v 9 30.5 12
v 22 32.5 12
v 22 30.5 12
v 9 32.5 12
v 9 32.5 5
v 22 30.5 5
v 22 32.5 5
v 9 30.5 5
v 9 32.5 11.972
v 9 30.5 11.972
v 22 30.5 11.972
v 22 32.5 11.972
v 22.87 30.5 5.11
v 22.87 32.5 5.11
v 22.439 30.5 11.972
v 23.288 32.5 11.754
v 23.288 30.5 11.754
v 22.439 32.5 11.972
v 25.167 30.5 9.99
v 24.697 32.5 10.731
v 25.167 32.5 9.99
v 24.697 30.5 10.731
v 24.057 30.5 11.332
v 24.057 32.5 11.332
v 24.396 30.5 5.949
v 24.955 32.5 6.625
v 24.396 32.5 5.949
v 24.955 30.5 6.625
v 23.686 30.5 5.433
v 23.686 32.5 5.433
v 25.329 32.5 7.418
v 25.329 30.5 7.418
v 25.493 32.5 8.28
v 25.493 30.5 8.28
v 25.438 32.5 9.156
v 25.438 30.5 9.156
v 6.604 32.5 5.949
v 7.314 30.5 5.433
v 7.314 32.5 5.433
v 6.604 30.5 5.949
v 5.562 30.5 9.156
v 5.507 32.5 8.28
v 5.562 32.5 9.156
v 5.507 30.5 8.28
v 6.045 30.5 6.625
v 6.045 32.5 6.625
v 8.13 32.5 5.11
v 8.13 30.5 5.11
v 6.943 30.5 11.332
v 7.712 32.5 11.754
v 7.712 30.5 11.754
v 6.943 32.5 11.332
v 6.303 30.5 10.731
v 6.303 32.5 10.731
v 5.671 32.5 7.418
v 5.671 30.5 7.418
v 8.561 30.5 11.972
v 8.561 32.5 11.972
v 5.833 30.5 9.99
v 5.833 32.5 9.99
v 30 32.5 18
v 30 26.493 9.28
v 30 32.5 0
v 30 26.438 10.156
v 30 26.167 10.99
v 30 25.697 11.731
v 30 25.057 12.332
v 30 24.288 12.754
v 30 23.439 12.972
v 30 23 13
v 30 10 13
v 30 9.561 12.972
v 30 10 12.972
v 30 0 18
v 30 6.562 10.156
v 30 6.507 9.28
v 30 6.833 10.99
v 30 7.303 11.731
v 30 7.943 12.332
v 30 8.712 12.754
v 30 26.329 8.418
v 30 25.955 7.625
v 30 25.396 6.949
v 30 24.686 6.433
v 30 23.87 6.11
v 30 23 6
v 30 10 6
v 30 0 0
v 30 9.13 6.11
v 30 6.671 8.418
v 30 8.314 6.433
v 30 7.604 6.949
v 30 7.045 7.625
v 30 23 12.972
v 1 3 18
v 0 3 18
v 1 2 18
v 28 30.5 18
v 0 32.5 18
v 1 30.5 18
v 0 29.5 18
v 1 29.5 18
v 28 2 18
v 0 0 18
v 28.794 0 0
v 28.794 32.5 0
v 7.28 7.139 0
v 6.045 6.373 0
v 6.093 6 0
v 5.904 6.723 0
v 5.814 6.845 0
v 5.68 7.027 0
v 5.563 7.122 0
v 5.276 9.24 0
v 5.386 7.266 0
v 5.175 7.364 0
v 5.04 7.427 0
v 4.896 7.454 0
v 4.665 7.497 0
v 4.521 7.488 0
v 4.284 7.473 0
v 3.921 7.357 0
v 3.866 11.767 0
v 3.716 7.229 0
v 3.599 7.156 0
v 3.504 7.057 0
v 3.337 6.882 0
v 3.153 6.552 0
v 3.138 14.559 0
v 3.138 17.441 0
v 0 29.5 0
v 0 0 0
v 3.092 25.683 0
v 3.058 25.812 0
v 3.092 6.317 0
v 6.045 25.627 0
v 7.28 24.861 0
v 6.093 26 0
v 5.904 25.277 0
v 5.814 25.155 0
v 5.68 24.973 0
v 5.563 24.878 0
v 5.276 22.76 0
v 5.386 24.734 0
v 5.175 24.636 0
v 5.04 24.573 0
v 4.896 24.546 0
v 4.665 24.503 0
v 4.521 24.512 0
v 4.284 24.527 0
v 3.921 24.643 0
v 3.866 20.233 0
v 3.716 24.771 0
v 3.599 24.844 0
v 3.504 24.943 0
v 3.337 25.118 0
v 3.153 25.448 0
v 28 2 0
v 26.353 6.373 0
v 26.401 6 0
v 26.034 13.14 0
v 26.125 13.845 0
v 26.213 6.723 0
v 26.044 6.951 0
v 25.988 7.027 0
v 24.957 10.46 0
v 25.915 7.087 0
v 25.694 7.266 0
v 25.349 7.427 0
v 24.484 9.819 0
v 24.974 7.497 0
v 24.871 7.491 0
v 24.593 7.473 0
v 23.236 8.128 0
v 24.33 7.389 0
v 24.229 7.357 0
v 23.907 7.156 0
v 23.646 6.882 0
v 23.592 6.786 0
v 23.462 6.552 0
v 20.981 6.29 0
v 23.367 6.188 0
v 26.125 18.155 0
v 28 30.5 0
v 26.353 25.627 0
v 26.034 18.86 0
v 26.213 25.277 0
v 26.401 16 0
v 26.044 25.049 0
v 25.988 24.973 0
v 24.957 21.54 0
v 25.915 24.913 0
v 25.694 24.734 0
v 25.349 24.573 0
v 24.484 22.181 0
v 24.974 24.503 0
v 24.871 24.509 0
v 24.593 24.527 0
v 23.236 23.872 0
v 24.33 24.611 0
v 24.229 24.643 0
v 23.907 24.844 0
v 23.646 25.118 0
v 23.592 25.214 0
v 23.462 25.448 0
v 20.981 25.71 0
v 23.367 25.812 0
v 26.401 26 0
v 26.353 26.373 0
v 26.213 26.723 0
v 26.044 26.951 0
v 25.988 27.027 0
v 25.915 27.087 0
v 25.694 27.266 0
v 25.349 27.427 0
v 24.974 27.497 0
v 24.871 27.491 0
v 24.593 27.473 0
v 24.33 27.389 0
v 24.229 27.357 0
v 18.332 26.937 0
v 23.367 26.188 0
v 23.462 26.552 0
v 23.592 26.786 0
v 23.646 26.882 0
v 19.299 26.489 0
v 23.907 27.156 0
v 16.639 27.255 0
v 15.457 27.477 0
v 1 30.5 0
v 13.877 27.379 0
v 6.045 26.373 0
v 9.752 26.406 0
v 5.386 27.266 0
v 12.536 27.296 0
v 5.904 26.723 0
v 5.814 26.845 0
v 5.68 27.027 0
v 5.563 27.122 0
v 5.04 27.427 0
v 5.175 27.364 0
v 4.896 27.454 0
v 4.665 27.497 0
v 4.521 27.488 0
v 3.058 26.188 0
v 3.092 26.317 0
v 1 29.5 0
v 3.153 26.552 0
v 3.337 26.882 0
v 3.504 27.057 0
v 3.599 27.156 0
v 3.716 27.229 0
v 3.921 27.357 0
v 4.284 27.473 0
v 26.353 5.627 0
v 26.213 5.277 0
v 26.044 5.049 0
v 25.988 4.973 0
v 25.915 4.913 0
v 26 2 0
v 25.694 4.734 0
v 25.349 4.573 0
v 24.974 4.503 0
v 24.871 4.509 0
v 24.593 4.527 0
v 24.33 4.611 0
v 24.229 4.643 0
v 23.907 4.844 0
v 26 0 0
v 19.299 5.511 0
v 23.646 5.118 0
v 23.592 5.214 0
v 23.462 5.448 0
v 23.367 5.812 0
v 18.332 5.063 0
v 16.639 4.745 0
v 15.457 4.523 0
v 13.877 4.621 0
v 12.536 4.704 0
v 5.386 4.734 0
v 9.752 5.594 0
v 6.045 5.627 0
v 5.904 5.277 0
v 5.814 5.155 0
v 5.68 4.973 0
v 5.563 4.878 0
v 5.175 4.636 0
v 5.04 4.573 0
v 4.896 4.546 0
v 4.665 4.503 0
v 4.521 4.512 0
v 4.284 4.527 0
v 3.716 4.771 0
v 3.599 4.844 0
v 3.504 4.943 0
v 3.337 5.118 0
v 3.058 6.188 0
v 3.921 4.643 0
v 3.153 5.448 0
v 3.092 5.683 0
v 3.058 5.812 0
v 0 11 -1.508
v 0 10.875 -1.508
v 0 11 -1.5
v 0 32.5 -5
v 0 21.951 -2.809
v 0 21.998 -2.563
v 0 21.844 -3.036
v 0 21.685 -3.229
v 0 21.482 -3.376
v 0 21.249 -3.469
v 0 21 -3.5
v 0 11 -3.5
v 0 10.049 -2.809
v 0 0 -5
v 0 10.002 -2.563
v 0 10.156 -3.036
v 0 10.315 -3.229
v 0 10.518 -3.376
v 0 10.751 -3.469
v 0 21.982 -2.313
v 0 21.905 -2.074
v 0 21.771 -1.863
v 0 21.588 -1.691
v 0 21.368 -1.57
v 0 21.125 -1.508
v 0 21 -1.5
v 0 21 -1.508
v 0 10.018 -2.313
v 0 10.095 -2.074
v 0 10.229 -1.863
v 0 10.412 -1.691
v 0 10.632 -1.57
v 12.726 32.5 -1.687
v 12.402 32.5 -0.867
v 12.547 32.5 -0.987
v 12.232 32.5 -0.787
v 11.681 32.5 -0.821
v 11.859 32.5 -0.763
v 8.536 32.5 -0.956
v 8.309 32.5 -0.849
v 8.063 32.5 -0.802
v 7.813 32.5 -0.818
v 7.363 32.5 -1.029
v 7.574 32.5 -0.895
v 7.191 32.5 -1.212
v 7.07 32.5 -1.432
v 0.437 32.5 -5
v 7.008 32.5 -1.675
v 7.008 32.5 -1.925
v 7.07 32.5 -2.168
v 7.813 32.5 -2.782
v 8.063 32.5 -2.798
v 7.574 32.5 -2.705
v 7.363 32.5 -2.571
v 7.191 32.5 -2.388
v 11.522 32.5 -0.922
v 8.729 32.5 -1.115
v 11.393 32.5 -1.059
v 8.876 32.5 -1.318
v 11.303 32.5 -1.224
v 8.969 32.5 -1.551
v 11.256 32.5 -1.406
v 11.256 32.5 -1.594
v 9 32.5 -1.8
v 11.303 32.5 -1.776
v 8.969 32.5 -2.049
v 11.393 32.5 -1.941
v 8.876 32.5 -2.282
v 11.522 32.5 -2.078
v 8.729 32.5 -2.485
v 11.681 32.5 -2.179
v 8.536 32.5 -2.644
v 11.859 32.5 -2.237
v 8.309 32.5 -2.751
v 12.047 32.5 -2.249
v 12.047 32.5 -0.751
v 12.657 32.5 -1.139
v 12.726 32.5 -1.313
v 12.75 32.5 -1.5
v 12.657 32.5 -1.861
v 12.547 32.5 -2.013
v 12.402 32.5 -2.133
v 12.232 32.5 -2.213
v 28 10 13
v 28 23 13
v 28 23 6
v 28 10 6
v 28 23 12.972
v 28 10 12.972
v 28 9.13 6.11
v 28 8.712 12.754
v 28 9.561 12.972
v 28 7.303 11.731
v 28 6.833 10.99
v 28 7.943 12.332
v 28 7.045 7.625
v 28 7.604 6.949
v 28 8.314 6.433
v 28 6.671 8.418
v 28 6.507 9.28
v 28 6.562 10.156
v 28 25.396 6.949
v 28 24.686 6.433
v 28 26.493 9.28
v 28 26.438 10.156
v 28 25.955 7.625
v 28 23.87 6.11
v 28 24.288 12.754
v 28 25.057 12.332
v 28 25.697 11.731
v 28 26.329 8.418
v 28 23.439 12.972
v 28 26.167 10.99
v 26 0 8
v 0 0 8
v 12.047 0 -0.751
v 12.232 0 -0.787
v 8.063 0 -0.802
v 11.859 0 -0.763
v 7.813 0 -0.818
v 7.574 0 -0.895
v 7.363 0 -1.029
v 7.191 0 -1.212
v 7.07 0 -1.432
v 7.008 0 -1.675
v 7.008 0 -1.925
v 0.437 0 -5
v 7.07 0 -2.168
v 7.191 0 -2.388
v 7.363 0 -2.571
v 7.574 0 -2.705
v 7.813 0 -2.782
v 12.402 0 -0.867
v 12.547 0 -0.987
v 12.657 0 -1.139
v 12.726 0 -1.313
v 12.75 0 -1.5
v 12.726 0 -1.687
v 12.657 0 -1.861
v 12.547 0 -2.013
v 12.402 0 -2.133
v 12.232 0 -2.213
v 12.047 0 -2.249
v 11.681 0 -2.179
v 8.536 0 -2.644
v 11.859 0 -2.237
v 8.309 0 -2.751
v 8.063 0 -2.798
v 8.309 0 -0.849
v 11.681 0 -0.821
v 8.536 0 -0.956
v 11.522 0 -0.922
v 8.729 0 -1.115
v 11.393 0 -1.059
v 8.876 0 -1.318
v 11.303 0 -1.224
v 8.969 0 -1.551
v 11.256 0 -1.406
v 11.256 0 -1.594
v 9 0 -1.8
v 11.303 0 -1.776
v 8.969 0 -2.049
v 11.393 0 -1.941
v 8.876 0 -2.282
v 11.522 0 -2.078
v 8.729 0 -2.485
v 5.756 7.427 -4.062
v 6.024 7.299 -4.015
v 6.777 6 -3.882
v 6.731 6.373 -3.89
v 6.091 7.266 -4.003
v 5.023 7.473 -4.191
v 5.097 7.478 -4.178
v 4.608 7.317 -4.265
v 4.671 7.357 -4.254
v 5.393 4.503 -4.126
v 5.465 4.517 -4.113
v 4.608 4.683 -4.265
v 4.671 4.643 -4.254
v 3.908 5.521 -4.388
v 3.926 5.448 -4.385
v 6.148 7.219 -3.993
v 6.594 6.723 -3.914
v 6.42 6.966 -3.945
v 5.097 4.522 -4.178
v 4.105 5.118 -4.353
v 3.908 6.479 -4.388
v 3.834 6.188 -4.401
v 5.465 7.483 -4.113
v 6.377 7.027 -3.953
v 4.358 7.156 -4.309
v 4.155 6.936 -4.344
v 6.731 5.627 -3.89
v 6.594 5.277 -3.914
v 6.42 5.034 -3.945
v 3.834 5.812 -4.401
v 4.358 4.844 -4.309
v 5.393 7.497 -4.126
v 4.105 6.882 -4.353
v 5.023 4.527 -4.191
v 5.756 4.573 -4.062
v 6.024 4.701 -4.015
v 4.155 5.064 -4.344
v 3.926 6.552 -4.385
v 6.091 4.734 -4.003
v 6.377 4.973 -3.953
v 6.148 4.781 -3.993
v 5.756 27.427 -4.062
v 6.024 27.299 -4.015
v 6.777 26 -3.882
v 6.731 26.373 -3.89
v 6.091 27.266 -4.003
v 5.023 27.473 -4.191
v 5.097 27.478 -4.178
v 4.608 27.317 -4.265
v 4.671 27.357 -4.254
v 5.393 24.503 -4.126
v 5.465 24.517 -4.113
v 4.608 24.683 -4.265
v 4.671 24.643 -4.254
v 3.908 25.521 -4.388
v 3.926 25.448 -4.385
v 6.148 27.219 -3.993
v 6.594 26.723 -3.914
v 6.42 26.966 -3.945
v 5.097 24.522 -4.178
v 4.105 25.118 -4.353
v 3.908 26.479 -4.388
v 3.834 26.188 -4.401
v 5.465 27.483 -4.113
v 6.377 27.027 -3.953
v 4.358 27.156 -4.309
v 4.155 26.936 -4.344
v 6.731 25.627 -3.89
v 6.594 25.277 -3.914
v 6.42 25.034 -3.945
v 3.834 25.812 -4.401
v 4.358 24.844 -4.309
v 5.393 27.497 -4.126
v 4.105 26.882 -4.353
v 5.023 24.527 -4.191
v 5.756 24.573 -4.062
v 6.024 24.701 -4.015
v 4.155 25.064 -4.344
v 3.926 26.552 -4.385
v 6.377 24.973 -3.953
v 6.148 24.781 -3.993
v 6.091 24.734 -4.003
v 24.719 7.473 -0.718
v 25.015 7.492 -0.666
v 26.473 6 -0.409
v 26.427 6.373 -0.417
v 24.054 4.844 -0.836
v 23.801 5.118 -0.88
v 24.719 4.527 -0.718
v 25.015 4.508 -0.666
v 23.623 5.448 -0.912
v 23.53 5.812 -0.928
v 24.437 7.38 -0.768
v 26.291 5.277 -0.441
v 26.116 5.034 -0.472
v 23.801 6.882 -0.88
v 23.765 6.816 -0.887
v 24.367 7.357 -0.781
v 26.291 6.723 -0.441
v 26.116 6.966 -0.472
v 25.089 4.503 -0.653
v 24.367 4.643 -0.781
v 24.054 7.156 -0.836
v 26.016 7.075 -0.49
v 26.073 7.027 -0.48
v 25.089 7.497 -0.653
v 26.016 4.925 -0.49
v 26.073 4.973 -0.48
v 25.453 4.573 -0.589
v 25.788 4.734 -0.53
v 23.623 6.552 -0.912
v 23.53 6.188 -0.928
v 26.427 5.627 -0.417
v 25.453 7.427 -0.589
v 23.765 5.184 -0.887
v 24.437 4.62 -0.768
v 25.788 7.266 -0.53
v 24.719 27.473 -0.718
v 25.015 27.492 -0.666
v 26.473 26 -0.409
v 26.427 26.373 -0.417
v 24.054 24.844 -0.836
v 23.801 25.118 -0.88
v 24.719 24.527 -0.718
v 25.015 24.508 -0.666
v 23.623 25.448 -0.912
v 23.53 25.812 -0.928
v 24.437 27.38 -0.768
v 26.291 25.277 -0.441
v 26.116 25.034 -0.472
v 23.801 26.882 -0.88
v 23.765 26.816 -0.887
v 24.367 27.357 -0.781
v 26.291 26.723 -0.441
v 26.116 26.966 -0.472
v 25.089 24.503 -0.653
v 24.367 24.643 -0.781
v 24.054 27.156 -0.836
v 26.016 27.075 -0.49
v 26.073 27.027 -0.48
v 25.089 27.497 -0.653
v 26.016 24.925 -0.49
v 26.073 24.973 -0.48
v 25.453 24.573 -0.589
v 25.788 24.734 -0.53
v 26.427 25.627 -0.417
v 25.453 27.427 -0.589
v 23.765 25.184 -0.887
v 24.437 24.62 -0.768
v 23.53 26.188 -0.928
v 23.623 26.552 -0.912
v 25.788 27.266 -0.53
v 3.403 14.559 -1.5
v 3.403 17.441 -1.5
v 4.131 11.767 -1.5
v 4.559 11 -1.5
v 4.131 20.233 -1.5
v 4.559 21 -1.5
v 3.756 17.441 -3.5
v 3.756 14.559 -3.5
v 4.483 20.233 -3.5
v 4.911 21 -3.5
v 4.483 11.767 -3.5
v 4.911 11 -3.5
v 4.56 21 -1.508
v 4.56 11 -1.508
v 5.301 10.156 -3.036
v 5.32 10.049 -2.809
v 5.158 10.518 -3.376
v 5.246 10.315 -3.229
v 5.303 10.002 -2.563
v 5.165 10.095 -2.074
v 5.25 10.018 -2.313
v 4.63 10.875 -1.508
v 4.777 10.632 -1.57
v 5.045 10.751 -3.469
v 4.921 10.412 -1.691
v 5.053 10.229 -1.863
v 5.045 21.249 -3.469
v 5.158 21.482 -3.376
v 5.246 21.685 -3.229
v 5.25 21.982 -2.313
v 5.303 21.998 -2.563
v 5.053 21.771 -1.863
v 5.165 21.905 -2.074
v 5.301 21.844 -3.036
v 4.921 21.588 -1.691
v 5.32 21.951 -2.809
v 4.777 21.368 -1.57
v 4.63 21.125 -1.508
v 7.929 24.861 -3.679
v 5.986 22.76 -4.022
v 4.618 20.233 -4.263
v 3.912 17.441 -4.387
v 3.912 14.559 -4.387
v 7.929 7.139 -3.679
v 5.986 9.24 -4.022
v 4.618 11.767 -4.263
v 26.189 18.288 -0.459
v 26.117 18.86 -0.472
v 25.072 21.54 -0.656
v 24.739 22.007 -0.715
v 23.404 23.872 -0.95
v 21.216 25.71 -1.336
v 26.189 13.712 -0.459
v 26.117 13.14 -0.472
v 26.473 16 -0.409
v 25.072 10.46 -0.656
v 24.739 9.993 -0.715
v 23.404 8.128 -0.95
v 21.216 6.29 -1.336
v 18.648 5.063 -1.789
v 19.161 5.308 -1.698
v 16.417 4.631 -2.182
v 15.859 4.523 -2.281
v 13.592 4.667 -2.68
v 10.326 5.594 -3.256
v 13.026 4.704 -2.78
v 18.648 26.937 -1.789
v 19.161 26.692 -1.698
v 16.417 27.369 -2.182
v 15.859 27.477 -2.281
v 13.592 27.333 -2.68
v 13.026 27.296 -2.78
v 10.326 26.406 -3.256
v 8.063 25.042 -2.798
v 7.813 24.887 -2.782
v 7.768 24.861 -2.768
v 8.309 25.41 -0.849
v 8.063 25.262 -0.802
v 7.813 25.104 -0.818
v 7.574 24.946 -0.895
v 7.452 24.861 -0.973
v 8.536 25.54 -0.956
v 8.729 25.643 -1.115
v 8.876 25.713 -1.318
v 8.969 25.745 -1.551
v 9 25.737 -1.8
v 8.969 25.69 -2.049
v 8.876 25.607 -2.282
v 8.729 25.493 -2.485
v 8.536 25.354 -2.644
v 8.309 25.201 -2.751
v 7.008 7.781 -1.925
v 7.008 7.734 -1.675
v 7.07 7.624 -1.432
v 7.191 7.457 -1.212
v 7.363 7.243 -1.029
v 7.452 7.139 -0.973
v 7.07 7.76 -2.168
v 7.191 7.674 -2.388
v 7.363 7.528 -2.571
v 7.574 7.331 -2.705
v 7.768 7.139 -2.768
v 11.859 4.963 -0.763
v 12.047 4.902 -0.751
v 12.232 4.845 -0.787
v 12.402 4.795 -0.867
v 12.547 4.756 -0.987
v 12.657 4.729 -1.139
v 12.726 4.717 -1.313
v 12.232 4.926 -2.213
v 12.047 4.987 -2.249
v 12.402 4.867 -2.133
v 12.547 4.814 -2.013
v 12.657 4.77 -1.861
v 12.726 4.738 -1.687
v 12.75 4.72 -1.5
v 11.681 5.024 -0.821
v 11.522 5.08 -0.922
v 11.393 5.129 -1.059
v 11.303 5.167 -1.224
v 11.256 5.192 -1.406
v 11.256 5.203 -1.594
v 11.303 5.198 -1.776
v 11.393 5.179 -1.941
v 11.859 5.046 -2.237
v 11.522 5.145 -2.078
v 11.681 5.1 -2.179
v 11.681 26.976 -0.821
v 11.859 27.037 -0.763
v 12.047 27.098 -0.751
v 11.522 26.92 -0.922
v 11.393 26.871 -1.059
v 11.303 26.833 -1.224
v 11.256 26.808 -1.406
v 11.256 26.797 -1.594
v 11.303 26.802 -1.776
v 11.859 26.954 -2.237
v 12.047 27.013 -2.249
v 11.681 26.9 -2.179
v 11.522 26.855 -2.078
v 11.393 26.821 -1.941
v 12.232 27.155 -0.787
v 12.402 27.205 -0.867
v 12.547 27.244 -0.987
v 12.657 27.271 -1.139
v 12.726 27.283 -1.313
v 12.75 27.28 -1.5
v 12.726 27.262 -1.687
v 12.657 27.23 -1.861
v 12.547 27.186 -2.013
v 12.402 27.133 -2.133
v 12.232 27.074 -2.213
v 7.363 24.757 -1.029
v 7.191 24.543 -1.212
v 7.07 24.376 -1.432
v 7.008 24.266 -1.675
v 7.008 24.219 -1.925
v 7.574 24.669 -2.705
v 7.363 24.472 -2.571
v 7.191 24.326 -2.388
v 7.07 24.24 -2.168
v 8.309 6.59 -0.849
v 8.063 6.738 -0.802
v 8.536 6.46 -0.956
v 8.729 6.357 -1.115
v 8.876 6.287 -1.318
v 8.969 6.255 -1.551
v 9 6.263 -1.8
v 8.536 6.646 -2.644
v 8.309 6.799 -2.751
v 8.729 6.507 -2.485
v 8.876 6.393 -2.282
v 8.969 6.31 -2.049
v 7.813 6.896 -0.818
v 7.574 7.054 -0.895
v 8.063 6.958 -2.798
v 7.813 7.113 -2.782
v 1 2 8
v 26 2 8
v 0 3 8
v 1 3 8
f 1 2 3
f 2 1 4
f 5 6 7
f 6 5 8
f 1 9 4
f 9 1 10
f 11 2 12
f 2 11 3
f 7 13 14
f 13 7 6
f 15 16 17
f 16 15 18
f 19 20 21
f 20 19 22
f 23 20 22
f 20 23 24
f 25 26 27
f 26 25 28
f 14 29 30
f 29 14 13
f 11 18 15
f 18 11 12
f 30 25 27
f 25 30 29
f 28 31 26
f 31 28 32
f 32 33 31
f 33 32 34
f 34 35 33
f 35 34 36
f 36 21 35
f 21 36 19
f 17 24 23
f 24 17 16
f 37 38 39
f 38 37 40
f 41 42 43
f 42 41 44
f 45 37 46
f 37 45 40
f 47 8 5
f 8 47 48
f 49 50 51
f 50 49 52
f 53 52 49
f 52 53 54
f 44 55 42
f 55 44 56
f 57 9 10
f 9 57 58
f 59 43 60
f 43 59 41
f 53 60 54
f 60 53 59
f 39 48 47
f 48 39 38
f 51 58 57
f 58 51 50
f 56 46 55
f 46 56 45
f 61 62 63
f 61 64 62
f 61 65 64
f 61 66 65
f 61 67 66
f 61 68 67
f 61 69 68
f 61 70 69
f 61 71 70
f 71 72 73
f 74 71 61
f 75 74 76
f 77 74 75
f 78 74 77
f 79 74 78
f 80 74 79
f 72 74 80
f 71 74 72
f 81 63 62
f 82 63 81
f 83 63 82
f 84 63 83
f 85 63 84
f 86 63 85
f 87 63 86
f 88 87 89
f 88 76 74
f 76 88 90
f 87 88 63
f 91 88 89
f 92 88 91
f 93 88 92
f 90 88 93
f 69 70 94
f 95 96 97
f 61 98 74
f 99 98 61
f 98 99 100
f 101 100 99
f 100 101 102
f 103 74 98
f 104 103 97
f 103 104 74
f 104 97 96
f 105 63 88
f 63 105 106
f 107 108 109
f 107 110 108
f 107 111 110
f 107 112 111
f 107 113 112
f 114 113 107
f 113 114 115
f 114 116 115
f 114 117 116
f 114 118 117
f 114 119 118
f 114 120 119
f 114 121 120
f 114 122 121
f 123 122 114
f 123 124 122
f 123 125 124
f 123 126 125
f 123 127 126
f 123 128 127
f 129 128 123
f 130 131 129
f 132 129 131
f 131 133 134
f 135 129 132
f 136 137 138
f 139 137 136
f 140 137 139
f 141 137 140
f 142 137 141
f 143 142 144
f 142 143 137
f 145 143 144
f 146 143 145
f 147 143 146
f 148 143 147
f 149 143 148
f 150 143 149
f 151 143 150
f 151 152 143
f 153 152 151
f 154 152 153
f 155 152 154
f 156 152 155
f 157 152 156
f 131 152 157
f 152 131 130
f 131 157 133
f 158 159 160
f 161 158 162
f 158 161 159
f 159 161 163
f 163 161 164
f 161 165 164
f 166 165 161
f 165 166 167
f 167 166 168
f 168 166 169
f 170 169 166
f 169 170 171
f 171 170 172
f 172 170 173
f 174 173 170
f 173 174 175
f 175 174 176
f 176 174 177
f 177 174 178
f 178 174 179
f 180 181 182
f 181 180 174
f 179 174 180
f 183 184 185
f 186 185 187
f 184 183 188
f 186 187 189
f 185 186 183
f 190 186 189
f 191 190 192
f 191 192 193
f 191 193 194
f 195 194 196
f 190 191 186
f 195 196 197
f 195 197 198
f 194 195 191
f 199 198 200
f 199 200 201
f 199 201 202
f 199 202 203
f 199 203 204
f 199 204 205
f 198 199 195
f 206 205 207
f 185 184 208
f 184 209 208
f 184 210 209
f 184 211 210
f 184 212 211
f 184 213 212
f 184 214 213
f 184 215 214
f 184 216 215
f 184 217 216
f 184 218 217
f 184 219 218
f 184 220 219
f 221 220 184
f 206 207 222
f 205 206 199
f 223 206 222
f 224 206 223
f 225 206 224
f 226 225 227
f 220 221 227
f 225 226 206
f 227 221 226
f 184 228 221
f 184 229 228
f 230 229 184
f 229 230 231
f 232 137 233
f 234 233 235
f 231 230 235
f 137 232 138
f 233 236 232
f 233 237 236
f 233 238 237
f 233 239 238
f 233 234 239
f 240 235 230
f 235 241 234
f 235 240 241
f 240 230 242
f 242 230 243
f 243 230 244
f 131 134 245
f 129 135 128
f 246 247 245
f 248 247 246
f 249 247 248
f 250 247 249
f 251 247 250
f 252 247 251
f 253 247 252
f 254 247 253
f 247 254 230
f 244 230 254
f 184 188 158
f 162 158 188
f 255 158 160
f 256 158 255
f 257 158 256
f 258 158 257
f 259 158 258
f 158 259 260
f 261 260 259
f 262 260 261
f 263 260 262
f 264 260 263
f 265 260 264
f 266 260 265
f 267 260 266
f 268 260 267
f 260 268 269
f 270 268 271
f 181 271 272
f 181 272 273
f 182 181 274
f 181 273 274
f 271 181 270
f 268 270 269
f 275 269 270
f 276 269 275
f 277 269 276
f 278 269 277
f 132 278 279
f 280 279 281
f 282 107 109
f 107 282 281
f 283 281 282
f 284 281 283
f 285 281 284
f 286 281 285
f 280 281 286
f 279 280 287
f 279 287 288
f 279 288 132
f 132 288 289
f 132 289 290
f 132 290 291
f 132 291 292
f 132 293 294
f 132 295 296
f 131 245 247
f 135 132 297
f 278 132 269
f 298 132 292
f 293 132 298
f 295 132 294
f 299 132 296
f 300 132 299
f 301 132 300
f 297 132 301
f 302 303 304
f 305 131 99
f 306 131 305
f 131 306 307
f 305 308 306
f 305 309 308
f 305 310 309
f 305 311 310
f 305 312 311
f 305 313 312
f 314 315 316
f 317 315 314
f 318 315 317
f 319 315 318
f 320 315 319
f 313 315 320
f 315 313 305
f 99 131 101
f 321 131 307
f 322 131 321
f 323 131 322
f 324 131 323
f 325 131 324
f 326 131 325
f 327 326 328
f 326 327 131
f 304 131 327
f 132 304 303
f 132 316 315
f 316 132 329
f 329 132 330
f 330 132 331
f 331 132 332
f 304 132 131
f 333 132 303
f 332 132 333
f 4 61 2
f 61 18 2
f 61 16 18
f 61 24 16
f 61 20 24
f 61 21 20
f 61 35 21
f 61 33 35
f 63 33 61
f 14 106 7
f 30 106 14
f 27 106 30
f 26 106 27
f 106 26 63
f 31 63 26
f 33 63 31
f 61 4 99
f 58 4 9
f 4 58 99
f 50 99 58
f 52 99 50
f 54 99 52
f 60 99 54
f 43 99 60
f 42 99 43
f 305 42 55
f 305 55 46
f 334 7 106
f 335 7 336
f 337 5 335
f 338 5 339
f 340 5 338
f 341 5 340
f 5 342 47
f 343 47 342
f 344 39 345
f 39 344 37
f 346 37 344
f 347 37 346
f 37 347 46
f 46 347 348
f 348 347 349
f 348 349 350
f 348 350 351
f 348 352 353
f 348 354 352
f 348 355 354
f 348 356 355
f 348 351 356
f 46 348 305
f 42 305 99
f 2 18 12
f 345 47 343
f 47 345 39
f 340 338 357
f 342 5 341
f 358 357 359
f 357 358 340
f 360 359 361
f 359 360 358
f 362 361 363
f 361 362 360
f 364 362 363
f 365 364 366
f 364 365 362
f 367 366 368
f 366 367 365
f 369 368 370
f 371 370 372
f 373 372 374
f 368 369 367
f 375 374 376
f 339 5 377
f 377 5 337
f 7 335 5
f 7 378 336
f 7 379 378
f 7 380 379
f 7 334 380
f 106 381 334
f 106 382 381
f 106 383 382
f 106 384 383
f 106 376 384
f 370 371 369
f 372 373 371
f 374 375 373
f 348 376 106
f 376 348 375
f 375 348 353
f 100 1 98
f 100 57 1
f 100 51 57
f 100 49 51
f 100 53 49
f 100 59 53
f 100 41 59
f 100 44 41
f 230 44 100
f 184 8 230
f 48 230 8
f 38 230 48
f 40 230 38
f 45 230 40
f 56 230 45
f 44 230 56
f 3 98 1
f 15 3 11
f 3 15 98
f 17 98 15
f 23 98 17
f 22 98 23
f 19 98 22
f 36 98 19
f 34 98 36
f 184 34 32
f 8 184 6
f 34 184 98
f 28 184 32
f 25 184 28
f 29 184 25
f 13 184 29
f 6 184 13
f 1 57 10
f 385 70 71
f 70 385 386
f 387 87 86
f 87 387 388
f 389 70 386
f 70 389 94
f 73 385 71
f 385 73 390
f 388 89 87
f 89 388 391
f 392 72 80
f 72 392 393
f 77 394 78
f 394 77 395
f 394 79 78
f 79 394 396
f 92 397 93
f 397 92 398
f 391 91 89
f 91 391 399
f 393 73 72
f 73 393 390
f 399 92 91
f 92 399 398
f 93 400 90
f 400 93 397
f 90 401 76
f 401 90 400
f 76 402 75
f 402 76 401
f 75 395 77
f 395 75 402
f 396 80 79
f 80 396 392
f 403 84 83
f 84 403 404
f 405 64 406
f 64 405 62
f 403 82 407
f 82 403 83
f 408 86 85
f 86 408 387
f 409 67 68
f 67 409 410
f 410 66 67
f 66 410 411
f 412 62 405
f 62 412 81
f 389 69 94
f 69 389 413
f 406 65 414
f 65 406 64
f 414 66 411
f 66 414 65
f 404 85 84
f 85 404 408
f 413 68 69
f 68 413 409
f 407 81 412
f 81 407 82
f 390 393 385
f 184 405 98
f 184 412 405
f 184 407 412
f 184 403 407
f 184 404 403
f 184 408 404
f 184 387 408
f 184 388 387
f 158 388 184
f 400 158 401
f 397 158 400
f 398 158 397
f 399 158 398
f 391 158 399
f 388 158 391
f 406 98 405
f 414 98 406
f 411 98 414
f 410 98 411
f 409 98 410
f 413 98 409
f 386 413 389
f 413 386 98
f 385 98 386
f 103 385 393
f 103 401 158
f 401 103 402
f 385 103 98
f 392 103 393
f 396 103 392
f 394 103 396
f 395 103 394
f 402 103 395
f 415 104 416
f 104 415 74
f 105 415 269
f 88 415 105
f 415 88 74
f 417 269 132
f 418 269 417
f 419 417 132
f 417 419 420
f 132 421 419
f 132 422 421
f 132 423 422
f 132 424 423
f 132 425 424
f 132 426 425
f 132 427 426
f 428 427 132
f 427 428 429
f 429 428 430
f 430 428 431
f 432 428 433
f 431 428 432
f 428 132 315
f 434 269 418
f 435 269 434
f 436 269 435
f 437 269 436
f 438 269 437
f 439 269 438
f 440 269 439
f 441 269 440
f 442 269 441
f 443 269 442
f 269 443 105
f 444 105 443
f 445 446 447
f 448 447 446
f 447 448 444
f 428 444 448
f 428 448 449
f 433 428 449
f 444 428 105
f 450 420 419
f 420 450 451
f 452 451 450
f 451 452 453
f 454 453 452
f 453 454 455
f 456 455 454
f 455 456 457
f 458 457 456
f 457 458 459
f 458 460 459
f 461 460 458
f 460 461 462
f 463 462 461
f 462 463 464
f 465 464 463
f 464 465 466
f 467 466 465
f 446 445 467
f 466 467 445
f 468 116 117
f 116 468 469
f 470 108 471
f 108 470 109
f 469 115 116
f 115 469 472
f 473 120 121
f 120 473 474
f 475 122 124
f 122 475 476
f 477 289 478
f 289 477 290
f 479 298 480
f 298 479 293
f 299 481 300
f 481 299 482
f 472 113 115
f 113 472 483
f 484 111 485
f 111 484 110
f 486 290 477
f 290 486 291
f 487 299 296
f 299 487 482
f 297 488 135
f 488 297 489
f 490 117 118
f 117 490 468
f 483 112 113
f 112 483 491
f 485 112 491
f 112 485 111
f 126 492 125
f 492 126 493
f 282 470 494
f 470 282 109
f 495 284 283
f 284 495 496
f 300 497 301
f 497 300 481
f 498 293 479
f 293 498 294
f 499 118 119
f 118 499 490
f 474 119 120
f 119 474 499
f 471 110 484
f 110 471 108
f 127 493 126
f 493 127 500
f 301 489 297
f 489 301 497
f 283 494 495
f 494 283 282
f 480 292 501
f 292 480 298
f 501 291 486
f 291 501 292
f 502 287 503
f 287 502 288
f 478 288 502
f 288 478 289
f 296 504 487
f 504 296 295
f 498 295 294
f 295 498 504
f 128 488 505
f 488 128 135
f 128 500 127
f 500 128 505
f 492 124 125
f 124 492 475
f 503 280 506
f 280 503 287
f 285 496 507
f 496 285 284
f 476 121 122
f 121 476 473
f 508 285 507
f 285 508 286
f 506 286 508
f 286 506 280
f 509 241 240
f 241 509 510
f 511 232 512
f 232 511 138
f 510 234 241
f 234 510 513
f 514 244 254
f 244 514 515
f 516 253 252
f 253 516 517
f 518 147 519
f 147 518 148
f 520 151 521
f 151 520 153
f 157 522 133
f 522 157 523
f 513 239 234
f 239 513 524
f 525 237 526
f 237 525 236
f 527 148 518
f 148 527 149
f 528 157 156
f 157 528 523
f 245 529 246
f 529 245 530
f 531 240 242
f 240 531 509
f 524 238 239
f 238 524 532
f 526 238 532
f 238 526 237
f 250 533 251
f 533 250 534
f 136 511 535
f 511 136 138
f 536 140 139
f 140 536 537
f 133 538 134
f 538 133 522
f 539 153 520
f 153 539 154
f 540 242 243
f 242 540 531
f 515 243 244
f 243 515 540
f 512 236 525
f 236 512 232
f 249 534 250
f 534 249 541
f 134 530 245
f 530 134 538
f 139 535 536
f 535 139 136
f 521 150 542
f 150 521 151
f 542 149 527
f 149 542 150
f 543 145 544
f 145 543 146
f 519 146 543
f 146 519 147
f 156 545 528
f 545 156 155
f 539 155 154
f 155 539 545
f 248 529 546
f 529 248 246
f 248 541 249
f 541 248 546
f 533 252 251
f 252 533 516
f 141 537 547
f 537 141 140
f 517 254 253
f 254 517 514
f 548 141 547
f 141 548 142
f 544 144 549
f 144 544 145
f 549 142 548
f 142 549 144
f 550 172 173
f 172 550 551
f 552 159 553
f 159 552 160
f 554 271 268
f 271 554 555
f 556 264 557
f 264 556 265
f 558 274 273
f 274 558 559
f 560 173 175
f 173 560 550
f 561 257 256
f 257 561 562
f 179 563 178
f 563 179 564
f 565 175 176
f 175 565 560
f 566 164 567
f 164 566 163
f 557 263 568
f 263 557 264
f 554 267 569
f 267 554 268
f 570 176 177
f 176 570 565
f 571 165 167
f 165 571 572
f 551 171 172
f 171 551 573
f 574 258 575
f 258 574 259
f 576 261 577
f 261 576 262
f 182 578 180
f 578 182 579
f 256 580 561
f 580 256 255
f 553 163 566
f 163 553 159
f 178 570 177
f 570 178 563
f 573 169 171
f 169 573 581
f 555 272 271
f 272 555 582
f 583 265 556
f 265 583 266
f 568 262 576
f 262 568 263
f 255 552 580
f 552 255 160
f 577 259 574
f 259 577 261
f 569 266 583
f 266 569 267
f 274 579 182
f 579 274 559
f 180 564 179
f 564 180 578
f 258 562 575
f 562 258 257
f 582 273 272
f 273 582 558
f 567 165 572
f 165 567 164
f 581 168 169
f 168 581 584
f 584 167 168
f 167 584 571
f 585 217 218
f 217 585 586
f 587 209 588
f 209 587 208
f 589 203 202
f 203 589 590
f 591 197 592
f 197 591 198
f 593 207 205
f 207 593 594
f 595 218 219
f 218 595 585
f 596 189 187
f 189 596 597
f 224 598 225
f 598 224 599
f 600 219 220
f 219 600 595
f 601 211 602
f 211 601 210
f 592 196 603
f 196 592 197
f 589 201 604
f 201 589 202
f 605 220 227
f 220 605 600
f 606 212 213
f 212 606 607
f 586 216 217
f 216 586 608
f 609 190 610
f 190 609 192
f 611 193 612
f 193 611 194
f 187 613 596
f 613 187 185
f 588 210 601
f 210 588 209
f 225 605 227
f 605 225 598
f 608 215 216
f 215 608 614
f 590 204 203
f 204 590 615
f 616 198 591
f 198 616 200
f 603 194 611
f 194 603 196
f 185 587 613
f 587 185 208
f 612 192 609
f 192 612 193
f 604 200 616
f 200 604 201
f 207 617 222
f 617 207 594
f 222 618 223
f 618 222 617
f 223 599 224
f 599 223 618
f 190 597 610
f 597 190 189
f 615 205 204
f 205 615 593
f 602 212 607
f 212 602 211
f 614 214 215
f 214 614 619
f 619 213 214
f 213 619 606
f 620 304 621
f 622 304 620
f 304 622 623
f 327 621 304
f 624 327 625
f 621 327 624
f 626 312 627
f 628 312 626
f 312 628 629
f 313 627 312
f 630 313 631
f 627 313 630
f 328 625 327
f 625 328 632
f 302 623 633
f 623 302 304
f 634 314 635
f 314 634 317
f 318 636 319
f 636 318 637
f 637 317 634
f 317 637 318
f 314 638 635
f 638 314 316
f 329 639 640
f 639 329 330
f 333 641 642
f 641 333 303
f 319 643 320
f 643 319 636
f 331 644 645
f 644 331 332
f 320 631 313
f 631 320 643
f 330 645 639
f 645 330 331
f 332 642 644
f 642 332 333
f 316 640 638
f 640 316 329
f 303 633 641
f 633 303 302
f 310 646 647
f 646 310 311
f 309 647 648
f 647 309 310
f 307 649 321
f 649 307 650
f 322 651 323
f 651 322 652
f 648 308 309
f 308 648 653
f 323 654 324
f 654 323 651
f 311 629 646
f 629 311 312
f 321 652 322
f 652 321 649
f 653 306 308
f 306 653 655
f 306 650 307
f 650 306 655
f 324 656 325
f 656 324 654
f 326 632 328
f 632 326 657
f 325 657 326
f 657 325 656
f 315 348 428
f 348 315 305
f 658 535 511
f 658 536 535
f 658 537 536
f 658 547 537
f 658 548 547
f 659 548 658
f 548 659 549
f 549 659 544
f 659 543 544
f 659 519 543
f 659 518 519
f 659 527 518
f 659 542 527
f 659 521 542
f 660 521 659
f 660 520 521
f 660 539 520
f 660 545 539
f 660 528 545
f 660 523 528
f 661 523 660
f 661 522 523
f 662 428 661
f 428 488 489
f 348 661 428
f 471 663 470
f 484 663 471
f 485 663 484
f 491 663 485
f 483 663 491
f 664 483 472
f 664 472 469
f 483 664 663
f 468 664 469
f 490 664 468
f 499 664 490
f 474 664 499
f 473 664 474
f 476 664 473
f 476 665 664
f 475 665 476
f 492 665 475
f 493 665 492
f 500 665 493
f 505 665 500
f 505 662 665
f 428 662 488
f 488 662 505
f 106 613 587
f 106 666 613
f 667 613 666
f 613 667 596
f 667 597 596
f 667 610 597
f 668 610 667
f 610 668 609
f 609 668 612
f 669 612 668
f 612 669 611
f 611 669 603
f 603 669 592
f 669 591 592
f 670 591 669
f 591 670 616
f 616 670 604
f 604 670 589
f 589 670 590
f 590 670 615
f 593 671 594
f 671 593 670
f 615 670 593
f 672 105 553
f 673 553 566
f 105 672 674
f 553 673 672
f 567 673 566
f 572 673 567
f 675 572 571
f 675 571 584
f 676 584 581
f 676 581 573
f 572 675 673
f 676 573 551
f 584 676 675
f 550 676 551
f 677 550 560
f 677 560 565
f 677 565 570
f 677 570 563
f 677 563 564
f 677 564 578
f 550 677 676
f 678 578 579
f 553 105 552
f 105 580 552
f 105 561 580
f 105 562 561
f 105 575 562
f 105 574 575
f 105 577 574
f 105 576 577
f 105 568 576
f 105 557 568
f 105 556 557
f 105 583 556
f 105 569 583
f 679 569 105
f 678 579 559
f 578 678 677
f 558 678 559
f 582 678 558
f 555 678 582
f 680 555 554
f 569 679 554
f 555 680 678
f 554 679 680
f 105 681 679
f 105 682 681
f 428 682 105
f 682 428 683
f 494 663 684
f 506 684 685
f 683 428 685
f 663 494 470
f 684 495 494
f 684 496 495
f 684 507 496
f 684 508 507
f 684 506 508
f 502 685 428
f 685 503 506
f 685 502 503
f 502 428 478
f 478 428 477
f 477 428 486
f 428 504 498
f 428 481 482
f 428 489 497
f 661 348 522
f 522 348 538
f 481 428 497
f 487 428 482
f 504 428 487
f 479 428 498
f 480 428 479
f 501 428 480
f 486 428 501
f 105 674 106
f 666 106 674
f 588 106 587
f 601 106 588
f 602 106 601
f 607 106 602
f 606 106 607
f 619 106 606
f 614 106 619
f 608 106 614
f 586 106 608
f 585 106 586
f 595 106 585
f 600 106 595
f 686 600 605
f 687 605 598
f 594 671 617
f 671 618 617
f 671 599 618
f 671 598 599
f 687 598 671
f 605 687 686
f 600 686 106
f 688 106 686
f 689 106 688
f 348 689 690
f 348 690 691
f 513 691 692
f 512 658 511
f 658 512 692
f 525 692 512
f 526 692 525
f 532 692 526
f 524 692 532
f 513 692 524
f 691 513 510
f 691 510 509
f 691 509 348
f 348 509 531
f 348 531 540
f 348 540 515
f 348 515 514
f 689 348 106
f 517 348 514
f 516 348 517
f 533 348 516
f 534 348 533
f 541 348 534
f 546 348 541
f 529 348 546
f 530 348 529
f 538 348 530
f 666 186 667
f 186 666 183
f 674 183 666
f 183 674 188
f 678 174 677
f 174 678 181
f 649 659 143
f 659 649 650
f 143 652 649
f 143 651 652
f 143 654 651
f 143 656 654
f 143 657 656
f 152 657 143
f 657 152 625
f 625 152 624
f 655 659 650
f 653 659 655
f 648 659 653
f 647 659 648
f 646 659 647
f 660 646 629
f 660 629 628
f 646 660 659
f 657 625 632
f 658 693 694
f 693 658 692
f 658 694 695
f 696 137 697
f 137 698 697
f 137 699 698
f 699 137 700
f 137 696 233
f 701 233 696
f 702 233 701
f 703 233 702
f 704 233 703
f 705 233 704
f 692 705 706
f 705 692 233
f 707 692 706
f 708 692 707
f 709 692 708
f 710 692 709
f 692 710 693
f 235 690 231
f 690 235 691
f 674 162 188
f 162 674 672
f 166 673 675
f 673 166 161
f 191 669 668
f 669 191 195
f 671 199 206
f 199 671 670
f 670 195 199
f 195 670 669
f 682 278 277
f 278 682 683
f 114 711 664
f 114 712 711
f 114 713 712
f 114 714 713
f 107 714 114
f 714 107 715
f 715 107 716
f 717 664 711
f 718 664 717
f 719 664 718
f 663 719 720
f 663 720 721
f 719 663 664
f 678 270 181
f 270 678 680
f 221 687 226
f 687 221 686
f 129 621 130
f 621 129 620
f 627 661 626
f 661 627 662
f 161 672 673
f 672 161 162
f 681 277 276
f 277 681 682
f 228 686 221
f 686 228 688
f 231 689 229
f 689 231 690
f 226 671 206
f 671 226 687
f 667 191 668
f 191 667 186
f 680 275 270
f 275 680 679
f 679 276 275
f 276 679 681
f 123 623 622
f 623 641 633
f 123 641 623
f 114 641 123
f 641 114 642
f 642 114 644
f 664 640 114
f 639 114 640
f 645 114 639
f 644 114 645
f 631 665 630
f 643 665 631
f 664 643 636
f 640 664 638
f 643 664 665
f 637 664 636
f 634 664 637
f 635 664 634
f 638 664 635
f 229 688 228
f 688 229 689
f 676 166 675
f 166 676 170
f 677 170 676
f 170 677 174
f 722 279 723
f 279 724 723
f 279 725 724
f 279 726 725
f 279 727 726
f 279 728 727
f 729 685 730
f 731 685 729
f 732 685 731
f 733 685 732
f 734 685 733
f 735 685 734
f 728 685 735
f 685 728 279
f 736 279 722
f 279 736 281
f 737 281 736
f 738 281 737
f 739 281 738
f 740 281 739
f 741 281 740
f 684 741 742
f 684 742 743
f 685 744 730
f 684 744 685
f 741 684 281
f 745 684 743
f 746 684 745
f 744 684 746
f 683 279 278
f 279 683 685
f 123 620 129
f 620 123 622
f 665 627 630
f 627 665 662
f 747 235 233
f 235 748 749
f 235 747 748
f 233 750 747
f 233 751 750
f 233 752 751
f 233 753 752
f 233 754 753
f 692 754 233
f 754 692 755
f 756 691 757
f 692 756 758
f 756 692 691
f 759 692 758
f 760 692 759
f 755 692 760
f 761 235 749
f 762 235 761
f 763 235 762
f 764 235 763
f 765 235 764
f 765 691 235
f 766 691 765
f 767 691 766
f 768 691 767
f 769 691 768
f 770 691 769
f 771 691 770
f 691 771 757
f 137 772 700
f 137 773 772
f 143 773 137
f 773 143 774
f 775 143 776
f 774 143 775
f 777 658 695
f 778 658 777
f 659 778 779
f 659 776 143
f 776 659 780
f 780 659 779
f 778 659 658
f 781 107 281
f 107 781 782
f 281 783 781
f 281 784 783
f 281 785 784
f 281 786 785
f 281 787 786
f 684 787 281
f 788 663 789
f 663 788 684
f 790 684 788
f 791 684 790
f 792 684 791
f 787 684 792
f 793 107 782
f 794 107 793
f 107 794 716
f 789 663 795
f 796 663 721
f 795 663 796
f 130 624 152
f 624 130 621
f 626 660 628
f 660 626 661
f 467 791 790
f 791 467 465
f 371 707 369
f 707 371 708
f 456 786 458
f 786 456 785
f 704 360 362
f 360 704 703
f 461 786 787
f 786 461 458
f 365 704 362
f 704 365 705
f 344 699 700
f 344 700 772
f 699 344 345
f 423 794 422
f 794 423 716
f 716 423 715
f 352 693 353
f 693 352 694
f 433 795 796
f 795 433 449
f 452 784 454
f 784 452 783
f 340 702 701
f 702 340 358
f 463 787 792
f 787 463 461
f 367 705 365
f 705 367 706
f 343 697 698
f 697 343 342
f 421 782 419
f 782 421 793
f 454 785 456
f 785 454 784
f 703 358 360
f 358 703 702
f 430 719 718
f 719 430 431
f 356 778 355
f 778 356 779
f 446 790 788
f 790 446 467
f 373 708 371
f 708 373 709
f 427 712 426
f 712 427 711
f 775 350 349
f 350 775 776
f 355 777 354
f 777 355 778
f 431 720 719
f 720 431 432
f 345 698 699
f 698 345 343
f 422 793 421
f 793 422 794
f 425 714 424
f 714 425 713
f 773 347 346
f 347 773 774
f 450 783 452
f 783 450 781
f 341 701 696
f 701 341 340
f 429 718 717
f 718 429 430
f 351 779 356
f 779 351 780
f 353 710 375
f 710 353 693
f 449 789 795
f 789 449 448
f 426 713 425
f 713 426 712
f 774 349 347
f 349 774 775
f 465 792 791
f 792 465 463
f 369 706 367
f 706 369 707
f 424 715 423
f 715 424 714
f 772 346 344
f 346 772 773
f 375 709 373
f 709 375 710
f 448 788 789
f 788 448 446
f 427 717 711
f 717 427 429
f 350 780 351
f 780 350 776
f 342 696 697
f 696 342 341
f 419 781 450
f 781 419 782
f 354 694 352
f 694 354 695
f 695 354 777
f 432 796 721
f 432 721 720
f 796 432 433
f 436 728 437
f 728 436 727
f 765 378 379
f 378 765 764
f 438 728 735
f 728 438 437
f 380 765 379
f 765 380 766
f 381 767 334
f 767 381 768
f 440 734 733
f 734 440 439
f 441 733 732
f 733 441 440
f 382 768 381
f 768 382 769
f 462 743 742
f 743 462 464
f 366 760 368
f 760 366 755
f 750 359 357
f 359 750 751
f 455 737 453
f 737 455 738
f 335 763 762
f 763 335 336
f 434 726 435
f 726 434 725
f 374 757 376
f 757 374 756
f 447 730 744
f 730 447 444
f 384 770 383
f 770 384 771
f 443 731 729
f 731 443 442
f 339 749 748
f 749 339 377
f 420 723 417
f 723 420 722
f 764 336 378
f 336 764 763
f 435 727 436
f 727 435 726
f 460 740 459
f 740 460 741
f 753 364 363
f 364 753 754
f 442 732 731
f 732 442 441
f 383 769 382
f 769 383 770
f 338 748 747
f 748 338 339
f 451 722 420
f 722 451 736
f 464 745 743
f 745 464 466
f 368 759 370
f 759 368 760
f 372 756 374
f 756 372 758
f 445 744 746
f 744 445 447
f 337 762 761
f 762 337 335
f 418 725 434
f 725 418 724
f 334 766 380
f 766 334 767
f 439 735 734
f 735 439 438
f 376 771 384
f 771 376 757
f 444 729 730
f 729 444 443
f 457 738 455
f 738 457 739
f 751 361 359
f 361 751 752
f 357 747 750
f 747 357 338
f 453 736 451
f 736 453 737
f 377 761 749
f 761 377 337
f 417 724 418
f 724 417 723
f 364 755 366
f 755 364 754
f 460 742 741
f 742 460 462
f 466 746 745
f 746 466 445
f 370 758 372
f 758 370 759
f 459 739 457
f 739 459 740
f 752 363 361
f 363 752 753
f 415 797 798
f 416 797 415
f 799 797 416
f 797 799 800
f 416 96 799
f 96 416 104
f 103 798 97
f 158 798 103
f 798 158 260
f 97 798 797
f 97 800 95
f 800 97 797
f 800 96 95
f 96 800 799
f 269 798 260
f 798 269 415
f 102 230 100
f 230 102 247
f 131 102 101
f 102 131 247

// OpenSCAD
/*
 * Based on "Y-Axis Bracket" by "daveth26":
 * http://www.thingiverse.com/thing:1104535
 *
 * Recreated and modified by:
 * Thomas Buck <xythobuz@xythobuz.de> in March 2016
 *
 * Licensed under the Creative Commons - Attribution license.
 */

// -----------------------------------------------------------

$fn = 25;

/*
%translate([-31.784, 42.247, 0])
    import("turnigy_3d_fabrikator_y-axis_fan_cheese_fan_bracket.stl");
*/

// -----------------------------------------------------------

module ellipse(w, l, d) {
    cube([d, l - w, w]);
    
    translate([0, 0, w / 2])
        rotate([0, 90, 0])
        cylinder(d = w, h = d);
    
    translate([0, l - w, w / 2])
        rotate([0, 90, 0])
        cylinder(d = w, h = d);
}

// -----------------------------------------------------------

// left arm
translate([0, 0, 8])
    cube([30, 2, 10]);

// left nub
translate([0, 0, 8])
    cube([1, 3, 10]);

// left support
translate([26, 0, 0])
    cube([2, 2, 8]);

// right arm
difference() {
    translate([0, 30.5, 0])
        cube([30, 2, 18]);
    
    translate([22, 28, 5])
        rotate([0, 0, 90])
        ellipse(7, 20, 8);
}
    
// right nub
translate([0, 29.5, 0])
    cube([1, 3, 18]);

// back wall
difference() {
    translate([28, 0, 0])
        cube([2, 32, 18]);
    
    translate([25, 10, 6])
        ellipse(7, 20, 8);
}

difference() {
    // base
    translate([0, 0, -5])
        cube([30, 32.5, 5]);
    
    // cut off angled bottom part
    rotate([0, -10, 0])
        translate([-2, -1, -11])
        cube([34, 34, 6]);
    
    // main fan hole
    rotate([0, -10, 0])
        translate([14.5, 16, -7])
        cylinder(d = 23, h = 10);
    
    // fan screw holes
    for (i = [1 : 2]) {
        for (j = [1 : 2]) {
            rotate([0, -10, 0])
                translate([14.5, 16, -7])
                translate([(((i % 2) == 0) ? 10 : -10),
                    (((j % 2) == 0) ? 10 : -10), 0])
                cylinder(d = 3, h = 10);
        }
    }
    
    // big air hole
    translate([8, 33, -1.8])
        rotate([90, 0, 0])
        cylinder(d = 2, h = 34);
    
    // small air hole
    translate([12, 33, -1.5])
        rotate([90, 0, 0])
        cylinder(d = 1.5, h = 34);
    
    // elliptical air hole
    translate([-1, 11, -3.5])
        ellipse(2, 12, 8);
}
